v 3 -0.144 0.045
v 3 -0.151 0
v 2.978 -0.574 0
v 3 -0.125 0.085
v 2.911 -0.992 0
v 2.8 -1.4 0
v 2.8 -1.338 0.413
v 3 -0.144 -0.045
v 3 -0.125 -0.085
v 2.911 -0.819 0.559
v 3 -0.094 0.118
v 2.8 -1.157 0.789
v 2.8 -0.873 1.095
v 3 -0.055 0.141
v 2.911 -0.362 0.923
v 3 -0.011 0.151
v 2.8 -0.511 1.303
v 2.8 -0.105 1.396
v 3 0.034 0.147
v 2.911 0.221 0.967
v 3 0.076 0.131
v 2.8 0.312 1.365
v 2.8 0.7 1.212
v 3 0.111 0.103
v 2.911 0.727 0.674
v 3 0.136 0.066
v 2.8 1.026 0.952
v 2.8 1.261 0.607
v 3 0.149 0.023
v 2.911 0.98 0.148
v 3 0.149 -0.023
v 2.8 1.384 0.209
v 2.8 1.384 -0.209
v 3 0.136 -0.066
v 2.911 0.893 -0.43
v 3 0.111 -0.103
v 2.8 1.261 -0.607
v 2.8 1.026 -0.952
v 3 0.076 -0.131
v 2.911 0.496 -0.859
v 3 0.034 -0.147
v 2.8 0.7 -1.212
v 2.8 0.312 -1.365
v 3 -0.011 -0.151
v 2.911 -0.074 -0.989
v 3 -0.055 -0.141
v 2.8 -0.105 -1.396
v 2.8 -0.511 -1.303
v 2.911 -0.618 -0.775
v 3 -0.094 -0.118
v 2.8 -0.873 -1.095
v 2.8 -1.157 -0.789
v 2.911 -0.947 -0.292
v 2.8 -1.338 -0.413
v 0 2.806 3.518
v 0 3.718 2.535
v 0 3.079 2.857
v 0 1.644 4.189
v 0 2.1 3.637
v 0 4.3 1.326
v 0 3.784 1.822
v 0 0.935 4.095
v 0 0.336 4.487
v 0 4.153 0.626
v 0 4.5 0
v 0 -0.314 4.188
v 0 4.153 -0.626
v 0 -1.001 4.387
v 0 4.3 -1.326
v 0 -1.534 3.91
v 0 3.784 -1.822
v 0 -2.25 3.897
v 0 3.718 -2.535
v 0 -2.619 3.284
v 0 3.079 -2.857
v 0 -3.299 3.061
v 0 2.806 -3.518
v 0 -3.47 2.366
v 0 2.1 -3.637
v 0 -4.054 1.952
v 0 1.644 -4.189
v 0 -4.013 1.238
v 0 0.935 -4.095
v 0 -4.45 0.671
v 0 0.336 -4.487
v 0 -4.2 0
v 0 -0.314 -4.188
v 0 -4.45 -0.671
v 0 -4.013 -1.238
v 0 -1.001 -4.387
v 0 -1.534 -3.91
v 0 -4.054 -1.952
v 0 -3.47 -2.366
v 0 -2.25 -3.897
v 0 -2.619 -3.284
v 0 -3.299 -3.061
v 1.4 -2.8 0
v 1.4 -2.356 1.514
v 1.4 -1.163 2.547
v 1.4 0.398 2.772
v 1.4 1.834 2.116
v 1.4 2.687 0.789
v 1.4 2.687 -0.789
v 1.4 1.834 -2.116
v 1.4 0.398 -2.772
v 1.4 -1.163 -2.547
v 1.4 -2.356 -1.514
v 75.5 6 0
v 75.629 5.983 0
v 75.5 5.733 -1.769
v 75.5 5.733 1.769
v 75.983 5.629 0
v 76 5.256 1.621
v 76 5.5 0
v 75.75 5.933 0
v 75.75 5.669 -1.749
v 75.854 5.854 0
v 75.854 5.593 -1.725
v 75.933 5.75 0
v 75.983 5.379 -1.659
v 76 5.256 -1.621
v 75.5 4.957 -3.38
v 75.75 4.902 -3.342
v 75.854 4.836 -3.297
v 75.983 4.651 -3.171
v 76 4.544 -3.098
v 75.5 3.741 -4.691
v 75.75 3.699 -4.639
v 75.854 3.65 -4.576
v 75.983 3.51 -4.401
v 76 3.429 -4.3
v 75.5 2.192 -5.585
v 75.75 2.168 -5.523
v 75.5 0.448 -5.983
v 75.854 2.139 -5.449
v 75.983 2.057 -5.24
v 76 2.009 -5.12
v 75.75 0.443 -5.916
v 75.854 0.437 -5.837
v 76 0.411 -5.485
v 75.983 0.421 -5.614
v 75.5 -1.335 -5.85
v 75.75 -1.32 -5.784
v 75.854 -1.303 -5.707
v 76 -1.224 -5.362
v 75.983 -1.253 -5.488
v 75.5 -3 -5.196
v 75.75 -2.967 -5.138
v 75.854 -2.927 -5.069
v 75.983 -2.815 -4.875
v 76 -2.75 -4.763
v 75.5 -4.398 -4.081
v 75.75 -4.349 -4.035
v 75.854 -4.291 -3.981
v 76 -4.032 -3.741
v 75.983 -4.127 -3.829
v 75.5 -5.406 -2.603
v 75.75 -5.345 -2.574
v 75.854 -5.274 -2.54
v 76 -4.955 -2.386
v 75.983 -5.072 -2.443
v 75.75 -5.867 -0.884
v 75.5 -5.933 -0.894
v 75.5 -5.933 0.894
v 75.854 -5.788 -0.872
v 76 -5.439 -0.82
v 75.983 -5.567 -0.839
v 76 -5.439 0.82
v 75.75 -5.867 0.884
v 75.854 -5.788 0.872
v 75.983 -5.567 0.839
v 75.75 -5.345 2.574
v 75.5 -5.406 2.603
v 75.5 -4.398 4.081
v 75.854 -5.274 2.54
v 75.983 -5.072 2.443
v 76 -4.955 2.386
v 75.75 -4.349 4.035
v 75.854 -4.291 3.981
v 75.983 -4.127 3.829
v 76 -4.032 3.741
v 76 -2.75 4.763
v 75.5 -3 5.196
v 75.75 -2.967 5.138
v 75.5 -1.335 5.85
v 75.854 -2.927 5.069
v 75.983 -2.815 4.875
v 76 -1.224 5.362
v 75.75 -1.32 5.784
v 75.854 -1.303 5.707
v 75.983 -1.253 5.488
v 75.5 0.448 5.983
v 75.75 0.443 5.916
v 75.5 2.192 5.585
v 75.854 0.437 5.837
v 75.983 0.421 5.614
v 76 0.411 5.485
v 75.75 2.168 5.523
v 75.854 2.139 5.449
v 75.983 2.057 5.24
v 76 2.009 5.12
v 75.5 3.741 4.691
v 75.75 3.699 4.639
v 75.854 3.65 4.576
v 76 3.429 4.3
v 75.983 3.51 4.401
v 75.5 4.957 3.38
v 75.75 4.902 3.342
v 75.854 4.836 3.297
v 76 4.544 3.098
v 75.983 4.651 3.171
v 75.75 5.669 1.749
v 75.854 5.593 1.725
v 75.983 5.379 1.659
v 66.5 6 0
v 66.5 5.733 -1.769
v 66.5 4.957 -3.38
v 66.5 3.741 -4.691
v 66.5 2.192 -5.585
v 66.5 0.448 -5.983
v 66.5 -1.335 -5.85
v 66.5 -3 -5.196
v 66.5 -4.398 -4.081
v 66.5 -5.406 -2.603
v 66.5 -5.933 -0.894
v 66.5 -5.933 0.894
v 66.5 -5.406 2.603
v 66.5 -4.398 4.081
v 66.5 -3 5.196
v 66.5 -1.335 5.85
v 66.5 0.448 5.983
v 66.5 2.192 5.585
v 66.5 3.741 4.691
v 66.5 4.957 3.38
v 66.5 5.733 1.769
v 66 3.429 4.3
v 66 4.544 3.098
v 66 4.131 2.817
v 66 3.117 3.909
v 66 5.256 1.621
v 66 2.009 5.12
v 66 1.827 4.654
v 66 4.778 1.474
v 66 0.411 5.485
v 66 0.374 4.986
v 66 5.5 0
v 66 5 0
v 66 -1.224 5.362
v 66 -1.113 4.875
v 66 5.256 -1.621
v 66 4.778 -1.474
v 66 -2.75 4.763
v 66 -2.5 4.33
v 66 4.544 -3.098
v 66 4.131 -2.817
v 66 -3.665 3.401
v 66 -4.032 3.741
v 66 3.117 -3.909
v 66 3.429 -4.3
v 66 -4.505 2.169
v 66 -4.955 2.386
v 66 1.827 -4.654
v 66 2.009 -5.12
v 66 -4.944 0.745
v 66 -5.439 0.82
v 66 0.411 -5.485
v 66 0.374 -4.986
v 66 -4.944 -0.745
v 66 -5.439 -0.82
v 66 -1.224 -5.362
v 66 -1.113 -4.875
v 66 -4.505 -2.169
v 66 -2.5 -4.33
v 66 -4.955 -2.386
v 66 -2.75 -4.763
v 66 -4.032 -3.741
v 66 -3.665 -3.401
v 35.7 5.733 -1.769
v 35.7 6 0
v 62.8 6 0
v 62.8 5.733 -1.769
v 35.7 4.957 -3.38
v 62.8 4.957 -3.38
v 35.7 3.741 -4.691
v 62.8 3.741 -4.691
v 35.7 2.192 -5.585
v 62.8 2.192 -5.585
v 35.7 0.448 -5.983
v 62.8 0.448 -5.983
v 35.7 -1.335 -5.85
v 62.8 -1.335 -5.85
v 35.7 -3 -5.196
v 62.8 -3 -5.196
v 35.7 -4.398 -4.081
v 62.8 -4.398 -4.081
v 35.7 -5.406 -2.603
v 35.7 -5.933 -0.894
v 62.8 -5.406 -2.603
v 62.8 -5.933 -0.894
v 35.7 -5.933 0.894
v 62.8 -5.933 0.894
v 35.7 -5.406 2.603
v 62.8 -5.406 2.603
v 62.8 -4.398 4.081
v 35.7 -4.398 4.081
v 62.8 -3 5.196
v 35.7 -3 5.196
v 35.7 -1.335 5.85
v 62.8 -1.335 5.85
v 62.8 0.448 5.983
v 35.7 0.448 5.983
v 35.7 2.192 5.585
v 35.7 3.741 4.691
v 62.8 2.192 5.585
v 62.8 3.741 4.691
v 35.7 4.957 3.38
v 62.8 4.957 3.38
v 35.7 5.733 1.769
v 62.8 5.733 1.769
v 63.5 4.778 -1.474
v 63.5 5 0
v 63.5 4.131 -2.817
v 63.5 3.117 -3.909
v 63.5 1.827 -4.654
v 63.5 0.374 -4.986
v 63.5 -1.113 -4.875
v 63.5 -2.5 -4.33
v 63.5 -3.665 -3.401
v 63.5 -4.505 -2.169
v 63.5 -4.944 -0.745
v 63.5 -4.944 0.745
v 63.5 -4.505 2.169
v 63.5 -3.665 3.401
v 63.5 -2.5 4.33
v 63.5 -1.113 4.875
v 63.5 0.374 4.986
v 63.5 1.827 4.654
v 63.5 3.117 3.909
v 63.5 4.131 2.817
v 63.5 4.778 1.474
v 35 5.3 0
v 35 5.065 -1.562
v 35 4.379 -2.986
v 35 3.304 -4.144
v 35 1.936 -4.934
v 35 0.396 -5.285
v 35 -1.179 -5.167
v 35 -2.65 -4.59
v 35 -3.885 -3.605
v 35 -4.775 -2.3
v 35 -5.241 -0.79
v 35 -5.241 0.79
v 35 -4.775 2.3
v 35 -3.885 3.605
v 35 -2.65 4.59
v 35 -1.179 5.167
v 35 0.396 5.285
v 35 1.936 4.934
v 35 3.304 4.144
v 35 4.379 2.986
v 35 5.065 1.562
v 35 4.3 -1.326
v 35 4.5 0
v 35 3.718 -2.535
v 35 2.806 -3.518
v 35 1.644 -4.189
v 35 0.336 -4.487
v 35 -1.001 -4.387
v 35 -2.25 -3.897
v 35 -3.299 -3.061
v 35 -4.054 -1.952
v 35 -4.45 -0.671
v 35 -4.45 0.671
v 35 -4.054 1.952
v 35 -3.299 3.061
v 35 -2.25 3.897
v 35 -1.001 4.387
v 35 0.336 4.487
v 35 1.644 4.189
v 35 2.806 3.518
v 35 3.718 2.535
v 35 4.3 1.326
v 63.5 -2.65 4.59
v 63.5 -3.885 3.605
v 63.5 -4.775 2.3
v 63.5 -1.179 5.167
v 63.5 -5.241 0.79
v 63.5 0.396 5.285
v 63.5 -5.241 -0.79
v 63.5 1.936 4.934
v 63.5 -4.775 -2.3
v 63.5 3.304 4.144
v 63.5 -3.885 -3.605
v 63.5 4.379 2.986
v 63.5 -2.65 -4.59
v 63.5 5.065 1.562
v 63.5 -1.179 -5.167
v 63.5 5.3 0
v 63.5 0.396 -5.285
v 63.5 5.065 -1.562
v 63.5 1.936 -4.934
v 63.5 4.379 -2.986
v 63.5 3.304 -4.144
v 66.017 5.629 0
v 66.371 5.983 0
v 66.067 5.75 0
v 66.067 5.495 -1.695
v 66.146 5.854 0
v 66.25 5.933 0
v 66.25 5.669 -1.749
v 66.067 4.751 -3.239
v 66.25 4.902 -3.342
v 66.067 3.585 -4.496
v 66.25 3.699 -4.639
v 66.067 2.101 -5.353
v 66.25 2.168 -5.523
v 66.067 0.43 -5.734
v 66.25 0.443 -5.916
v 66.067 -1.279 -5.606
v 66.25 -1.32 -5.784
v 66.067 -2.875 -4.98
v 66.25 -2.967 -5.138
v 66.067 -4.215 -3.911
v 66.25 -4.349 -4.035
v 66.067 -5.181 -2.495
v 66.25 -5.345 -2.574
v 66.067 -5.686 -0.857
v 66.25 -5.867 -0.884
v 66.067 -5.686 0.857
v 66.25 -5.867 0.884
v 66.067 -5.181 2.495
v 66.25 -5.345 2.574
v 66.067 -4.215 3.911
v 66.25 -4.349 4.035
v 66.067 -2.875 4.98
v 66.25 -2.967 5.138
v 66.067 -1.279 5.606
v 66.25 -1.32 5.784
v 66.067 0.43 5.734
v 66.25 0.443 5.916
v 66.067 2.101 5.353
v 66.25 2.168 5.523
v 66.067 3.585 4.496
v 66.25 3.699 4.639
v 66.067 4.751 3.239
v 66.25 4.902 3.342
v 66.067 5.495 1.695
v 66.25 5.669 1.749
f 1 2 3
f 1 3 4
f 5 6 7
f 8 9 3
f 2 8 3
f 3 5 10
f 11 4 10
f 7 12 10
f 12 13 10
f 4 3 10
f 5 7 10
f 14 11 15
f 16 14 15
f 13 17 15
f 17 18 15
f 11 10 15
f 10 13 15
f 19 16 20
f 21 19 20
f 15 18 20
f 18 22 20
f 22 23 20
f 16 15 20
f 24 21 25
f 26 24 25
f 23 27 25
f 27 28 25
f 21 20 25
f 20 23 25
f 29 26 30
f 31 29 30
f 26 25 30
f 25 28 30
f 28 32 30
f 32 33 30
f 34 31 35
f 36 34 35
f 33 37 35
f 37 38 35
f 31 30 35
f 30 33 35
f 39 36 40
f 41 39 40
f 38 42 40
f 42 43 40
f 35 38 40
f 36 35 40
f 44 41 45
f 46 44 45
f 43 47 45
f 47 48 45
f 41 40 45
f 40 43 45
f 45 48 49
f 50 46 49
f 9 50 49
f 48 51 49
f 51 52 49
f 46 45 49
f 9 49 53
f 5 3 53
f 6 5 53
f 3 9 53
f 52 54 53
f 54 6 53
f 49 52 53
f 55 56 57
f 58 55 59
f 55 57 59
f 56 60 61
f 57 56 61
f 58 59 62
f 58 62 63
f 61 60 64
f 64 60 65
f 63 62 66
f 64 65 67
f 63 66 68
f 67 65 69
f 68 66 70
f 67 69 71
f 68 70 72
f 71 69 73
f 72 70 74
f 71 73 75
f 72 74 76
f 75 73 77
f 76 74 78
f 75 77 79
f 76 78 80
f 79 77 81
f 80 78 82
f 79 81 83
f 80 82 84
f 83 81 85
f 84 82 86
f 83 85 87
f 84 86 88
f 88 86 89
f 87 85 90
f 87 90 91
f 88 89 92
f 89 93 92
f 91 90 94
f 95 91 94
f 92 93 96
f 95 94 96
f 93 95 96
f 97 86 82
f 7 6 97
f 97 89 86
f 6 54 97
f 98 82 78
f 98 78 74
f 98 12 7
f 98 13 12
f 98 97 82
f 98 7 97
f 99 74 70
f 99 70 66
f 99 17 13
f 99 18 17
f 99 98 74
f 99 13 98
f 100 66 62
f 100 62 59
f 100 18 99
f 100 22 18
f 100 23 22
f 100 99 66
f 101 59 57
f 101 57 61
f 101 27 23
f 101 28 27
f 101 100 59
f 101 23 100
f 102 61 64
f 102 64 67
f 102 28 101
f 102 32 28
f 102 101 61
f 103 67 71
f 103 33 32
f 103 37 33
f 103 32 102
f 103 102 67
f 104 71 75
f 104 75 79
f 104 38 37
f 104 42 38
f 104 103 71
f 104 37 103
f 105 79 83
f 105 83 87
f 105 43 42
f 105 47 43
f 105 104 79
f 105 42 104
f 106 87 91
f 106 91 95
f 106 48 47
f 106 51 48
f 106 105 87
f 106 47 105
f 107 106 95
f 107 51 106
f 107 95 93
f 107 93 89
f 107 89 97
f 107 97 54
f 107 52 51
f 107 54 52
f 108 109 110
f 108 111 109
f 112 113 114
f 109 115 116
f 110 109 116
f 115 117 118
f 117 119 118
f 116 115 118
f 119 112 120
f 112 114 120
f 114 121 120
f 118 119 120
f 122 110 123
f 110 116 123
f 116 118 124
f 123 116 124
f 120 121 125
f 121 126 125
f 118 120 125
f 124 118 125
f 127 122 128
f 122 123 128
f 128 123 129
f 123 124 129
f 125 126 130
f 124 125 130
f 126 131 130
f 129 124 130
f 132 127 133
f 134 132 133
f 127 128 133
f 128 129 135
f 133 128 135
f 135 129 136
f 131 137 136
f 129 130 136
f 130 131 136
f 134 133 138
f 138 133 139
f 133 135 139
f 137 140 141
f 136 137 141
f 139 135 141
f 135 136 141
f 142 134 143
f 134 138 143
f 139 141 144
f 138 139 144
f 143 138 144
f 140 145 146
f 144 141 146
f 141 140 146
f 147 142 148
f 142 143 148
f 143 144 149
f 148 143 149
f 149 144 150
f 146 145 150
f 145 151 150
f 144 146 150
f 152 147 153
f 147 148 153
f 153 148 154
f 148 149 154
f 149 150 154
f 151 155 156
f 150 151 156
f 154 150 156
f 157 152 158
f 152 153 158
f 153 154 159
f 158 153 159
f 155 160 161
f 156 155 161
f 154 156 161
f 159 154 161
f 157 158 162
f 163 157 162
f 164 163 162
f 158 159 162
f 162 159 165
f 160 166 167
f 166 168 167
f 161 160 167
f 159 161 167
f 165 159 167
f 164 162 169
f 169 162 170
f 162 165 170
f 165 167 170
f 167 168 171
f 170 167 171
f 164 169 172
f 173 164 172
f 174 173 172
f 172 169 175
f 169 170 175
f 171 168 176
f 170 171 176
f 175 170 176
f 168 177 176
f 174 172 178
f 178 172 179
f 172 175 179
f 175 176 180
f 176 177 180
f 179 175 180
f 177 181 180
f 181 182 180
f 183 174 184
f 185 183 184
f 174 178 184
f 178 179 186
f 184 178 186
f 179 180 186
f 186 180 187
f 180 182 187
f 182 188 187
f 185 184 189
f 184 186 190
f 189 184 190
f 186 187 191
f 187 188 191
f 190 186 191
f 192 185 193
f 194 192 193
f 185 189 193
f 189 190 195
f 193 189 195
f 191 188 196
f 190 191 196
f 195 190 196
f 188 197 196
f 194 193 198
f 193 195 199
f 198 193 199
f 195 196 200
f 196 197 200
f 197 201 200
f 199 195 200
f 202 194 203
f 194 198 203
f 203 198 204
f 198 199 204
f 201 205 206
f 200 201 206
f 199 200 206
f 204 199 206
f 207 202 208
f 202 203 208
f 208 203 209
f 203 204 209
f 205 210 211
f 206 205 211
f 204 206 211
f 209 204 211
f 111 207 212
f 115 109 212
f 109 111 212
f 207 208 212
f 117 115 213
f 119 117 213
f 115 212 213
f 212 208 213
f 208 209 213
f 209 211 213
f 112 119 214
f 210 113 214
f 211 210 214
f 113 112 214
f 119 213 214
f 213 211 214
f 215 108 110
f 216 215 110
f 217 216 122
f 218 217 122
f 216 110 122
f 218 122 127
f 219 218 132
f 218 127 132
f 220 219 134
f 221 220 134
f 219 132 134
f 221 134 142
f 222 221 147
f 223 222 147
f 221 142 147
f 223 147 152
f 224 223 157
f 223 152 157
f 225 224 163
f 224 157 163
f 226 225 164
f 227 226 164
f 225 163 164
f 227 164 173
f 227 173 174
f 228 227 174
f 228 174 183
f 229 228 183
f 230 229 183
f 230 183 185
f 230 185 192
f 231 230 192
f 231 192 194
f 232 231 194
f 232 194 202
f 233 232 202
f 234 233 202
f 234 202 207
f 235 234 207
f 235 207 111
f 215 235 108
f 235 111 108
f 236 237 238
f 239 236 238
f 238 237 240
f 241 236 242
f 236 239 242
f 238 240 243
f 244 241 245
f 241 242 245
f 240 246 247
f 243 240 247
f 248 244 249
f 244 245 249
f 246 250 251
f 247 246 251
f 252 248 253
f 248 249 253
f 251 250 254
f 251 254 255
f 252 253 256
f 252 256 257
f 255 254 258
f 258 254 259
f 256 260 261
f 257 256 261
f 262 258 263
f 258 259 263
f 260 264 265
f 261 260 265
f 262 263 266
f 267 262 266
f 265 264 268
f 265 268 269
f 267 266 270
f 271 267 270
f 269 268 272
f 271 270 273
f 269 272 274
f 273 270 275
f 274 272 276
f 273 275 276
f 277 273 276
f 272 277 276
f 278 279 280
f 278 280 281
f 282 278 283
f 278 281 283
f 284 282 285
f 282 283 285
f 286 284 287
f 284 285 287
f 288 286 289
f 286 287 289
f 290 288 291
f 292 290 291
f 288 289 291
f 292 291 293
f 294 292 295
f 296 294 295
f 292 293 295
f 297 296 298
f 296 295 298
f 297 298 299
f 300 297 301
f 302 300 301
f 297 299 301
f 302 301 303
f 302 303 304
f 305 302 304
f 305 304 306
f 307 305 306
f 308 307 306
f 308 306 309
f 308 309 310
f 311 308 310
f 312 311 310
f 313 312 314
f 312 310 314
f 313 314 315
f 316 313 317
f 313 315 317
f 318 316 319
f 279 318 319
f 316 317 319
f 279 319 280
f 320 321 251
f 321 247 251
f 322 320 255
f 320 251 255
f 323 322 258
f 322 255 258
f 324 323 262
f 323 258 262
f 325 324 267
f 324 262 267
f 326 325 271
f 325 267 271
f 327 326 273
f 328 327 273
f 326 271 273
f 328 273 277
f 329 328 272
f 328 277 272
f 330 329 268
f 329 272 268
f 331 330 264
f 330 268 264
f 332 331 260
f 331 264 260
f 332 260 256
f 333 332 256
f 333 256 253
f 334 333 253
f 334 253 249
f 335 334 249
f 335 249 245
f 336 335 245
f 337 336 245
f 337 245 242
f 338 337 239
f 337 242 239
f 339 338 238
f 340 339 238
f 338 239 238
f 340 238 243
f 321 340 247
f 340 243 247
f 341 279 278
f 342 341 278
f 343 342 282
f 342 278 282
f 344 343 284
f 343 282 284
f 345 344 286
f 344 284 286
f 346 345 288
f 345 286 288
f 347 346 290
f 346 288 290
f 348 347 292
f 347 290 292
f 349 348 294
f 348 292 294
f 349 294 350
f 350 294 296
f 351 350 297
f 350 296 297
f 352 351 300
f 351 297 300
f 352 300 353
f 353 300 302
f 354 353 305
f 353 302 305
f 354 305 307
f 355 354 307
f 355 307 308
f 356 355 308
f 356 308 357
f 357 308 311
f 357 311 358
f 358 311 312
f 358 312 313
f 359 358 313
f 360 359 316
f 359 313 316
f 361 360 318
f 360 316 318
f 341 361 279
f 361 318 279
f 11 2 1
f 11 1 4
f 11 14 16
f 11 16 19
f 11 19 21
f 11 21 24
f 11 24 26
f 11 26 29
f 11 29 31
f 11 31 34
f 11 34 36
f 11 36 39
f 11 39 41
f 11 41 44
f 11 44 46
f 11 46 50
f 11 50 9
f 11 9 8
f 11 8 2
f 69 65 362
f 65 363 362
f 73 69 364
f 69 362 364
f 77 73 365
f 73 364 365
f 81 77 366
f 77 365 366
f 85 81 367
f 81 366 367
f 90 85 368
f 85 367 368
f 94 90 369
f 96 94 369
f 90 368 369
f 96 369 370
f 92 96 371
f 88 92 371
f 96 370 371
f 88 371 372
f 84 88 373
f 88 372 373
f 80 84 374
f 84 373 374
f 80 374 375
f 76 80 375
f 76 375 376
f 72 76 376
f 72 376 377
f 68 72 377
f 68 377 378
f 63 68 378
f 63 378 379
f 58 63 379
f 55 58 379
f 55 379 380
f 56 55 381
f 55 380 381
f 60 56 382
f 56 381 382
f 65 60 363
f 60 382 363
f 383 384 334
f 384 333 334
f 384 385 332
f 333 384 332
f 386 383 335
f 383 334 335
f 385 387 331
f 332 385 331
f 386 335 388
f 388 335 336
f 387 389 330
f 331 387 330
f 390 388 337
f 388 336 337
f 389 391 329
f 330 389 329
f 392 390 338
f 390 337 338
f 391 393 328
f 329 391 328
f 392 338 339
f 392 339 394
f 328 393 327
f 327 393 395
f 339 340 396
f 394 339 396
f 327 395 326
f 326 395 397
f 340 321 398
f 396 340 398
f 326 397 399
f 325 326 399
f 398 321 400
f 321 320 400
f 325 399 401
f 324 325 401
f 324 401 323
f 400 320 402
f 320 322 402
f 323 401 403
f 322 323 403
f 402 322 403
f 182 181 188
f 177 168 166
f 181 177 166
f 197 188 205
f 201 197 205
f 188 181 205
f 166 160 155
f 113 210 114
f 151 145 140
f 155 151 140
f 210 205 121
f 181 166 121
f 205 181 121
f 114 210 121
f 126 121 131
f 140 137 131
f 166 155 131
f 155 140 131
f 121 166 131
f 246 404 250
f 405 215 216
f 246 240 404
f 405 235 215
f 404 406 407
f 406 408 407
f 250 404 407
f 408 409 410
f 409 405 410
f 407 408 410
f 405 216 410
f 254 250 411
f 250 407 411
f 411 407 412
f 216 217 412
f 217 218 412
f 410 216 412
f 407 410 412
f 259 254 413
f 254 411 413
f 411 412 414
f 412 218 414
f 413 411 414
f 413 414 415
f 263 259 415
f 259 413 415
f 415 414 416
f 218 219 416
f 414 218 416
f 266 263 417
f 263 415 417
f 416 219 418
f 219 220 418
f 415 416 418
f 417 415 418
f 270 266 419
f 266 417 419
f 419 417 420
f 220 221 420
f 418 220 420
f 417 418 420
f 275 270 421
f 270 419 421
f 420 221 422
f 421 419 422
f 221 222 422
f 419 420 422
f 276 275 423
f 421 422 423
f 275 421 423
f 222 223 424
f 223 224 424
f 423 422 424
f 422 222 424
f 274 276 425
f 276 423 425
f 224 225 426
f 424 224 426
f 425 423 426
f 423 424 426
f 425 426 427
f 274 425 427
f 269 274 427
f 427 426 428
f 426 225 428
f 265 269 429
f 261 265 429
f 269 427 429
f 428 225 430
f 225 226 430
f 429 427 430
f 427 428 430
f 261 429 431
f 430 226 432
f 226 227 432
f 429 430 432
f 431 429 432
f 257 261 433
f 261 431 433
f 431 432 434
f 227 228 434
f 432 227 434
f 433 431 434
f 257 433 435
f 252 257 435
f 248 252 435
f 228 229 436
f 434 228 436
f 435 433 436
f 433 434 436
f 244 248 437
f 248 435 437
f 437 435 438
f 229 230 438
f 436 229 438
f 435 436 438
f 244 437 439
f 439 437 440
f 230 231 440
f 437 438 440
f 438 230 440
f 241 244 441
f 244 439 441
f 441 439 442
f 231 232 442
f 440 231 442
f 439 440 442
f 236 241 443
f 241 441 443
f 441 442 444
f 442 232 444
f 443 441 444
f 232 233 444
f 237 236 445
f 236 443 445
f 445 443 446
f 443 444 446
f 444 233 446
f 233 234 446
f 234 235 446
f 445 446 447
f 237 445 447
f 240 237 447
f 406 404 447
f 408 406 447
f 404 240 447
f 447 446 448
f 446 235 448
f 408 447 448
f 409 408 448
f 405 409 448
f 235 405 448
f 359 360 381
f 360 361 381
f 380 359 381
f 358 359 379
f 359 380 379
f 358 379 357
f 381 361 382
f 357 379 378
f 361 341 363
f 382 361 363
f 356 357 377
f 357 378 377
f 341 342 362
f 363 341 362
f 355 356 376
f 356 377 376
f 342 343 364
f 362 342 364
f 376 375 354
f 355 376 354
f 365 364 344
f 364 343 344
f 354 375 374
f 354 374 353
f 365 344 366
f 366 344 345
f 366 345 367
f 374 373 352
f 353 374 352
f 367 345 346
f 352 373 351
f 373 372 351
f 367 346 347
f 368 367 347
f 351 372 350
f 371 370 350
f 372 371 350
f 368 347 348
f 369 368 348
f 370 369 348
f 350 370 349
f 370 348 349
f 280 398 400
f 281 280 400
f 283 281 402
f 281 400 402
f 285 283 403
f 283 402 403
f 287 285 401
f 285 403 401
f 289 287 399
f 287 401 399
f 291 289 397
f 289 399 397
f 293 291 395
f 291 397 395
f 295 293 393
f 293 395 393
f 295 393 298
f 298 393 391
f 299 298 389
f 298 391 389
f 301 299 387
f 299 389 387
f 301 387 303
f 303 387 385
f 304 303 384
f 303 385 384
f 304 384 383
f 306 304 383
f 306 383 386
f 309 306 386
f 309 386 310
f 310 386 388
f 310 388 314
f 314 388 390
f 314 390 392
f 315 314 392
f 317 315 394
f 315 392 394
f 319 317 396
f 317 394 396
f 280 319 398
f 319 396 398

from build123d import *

# Parameters (mm, degrees)
CHANFRO1_SIZE         = 0.7
FILETE1_R             = 0.5
ESBO_O5_R             = 1.4
CORTE_EXTRUS_O1_DEPTH = 3
CHANFRO3_SIZE         = 2.8
FILETE2_R             = 4


with BuildPart() as part:
    # Esboço1 → Revolução1 (revolve)
    with BuildSketch(Plane.XY):
        Polygon((0, 0), (0, 4.5), (35, 4.5), (35, 6), (63.5, 6), (63.5, 5), (66, 5), (66, 6), (76, 6), (76, 0), align=None)
    revolve(axis=Axis((76, 0, 0), (-1, 0, 0)))

    # Chanfro1
    chanfro1_edges = [part.edges().sort_by_distance(p)[0] for p in [
        (63.5, -6, 0),
        (35, -6, 0),
    ]]
    chamfer(chanfro1_edges, length=CHANFRO1_SIZE)

    # Filete1
    filete1_edges = [part.edges().sort_by_distance(p)[0] for p in [
        (76, -6, 0),
        (66, -6, 0),
    ]]
    fillet(filete1_edges, radius=FILETE1_R)

    # Esboço5 → Corte-extrusão1 (cut)
    with BuildSketch(Plane.ZY):
        with Locations(Location((0, 0, 0), (0, 0, 270))):
            Circle(ESBO_O5_R)
    extrude(amount=-CORTE_EXTRUS_O1_DEPTH, mode=Mode.SUBTRACT)

    # Chanfro3
    chanfro3_edges = [part.edges().sort_by_distance(p)[0] for p in [
        (0, 1.4, 0),
    ]]
    chamfer(chanfro3_edges, length=CHANFRO3_SIZE)

    # Filete2
    # the kernel refuses this fillet: 4 mm, written as the material it adds along each edge
    with BuildSketch(Plane(origin=(3, 0, 0), x_dir=(0, -1, 0), z_dir=(0, 0, -1))) as filete2_piece_1:
        with BuildLine():
            CenterArc((0.1510004, 4), FILETE2_R, 270, 18.194872339)
            Line((0.1510004, 0), (0.1510004, -0.08))
            Line((0.1510004, -0.08), (1.4, -0.08))
            Line((1.4, -0.08), (1.48, 0))
            ThreePointArc((1.48, 0), (1.48, 0.1), (1.424979992, 0.124))
            Line((1.424979992, 0.124), (1.4, 0.2))
        make_face()
    revolve(axis=Axis((3, 0, 0), (-1, 0, 0)))


solid = part.part
